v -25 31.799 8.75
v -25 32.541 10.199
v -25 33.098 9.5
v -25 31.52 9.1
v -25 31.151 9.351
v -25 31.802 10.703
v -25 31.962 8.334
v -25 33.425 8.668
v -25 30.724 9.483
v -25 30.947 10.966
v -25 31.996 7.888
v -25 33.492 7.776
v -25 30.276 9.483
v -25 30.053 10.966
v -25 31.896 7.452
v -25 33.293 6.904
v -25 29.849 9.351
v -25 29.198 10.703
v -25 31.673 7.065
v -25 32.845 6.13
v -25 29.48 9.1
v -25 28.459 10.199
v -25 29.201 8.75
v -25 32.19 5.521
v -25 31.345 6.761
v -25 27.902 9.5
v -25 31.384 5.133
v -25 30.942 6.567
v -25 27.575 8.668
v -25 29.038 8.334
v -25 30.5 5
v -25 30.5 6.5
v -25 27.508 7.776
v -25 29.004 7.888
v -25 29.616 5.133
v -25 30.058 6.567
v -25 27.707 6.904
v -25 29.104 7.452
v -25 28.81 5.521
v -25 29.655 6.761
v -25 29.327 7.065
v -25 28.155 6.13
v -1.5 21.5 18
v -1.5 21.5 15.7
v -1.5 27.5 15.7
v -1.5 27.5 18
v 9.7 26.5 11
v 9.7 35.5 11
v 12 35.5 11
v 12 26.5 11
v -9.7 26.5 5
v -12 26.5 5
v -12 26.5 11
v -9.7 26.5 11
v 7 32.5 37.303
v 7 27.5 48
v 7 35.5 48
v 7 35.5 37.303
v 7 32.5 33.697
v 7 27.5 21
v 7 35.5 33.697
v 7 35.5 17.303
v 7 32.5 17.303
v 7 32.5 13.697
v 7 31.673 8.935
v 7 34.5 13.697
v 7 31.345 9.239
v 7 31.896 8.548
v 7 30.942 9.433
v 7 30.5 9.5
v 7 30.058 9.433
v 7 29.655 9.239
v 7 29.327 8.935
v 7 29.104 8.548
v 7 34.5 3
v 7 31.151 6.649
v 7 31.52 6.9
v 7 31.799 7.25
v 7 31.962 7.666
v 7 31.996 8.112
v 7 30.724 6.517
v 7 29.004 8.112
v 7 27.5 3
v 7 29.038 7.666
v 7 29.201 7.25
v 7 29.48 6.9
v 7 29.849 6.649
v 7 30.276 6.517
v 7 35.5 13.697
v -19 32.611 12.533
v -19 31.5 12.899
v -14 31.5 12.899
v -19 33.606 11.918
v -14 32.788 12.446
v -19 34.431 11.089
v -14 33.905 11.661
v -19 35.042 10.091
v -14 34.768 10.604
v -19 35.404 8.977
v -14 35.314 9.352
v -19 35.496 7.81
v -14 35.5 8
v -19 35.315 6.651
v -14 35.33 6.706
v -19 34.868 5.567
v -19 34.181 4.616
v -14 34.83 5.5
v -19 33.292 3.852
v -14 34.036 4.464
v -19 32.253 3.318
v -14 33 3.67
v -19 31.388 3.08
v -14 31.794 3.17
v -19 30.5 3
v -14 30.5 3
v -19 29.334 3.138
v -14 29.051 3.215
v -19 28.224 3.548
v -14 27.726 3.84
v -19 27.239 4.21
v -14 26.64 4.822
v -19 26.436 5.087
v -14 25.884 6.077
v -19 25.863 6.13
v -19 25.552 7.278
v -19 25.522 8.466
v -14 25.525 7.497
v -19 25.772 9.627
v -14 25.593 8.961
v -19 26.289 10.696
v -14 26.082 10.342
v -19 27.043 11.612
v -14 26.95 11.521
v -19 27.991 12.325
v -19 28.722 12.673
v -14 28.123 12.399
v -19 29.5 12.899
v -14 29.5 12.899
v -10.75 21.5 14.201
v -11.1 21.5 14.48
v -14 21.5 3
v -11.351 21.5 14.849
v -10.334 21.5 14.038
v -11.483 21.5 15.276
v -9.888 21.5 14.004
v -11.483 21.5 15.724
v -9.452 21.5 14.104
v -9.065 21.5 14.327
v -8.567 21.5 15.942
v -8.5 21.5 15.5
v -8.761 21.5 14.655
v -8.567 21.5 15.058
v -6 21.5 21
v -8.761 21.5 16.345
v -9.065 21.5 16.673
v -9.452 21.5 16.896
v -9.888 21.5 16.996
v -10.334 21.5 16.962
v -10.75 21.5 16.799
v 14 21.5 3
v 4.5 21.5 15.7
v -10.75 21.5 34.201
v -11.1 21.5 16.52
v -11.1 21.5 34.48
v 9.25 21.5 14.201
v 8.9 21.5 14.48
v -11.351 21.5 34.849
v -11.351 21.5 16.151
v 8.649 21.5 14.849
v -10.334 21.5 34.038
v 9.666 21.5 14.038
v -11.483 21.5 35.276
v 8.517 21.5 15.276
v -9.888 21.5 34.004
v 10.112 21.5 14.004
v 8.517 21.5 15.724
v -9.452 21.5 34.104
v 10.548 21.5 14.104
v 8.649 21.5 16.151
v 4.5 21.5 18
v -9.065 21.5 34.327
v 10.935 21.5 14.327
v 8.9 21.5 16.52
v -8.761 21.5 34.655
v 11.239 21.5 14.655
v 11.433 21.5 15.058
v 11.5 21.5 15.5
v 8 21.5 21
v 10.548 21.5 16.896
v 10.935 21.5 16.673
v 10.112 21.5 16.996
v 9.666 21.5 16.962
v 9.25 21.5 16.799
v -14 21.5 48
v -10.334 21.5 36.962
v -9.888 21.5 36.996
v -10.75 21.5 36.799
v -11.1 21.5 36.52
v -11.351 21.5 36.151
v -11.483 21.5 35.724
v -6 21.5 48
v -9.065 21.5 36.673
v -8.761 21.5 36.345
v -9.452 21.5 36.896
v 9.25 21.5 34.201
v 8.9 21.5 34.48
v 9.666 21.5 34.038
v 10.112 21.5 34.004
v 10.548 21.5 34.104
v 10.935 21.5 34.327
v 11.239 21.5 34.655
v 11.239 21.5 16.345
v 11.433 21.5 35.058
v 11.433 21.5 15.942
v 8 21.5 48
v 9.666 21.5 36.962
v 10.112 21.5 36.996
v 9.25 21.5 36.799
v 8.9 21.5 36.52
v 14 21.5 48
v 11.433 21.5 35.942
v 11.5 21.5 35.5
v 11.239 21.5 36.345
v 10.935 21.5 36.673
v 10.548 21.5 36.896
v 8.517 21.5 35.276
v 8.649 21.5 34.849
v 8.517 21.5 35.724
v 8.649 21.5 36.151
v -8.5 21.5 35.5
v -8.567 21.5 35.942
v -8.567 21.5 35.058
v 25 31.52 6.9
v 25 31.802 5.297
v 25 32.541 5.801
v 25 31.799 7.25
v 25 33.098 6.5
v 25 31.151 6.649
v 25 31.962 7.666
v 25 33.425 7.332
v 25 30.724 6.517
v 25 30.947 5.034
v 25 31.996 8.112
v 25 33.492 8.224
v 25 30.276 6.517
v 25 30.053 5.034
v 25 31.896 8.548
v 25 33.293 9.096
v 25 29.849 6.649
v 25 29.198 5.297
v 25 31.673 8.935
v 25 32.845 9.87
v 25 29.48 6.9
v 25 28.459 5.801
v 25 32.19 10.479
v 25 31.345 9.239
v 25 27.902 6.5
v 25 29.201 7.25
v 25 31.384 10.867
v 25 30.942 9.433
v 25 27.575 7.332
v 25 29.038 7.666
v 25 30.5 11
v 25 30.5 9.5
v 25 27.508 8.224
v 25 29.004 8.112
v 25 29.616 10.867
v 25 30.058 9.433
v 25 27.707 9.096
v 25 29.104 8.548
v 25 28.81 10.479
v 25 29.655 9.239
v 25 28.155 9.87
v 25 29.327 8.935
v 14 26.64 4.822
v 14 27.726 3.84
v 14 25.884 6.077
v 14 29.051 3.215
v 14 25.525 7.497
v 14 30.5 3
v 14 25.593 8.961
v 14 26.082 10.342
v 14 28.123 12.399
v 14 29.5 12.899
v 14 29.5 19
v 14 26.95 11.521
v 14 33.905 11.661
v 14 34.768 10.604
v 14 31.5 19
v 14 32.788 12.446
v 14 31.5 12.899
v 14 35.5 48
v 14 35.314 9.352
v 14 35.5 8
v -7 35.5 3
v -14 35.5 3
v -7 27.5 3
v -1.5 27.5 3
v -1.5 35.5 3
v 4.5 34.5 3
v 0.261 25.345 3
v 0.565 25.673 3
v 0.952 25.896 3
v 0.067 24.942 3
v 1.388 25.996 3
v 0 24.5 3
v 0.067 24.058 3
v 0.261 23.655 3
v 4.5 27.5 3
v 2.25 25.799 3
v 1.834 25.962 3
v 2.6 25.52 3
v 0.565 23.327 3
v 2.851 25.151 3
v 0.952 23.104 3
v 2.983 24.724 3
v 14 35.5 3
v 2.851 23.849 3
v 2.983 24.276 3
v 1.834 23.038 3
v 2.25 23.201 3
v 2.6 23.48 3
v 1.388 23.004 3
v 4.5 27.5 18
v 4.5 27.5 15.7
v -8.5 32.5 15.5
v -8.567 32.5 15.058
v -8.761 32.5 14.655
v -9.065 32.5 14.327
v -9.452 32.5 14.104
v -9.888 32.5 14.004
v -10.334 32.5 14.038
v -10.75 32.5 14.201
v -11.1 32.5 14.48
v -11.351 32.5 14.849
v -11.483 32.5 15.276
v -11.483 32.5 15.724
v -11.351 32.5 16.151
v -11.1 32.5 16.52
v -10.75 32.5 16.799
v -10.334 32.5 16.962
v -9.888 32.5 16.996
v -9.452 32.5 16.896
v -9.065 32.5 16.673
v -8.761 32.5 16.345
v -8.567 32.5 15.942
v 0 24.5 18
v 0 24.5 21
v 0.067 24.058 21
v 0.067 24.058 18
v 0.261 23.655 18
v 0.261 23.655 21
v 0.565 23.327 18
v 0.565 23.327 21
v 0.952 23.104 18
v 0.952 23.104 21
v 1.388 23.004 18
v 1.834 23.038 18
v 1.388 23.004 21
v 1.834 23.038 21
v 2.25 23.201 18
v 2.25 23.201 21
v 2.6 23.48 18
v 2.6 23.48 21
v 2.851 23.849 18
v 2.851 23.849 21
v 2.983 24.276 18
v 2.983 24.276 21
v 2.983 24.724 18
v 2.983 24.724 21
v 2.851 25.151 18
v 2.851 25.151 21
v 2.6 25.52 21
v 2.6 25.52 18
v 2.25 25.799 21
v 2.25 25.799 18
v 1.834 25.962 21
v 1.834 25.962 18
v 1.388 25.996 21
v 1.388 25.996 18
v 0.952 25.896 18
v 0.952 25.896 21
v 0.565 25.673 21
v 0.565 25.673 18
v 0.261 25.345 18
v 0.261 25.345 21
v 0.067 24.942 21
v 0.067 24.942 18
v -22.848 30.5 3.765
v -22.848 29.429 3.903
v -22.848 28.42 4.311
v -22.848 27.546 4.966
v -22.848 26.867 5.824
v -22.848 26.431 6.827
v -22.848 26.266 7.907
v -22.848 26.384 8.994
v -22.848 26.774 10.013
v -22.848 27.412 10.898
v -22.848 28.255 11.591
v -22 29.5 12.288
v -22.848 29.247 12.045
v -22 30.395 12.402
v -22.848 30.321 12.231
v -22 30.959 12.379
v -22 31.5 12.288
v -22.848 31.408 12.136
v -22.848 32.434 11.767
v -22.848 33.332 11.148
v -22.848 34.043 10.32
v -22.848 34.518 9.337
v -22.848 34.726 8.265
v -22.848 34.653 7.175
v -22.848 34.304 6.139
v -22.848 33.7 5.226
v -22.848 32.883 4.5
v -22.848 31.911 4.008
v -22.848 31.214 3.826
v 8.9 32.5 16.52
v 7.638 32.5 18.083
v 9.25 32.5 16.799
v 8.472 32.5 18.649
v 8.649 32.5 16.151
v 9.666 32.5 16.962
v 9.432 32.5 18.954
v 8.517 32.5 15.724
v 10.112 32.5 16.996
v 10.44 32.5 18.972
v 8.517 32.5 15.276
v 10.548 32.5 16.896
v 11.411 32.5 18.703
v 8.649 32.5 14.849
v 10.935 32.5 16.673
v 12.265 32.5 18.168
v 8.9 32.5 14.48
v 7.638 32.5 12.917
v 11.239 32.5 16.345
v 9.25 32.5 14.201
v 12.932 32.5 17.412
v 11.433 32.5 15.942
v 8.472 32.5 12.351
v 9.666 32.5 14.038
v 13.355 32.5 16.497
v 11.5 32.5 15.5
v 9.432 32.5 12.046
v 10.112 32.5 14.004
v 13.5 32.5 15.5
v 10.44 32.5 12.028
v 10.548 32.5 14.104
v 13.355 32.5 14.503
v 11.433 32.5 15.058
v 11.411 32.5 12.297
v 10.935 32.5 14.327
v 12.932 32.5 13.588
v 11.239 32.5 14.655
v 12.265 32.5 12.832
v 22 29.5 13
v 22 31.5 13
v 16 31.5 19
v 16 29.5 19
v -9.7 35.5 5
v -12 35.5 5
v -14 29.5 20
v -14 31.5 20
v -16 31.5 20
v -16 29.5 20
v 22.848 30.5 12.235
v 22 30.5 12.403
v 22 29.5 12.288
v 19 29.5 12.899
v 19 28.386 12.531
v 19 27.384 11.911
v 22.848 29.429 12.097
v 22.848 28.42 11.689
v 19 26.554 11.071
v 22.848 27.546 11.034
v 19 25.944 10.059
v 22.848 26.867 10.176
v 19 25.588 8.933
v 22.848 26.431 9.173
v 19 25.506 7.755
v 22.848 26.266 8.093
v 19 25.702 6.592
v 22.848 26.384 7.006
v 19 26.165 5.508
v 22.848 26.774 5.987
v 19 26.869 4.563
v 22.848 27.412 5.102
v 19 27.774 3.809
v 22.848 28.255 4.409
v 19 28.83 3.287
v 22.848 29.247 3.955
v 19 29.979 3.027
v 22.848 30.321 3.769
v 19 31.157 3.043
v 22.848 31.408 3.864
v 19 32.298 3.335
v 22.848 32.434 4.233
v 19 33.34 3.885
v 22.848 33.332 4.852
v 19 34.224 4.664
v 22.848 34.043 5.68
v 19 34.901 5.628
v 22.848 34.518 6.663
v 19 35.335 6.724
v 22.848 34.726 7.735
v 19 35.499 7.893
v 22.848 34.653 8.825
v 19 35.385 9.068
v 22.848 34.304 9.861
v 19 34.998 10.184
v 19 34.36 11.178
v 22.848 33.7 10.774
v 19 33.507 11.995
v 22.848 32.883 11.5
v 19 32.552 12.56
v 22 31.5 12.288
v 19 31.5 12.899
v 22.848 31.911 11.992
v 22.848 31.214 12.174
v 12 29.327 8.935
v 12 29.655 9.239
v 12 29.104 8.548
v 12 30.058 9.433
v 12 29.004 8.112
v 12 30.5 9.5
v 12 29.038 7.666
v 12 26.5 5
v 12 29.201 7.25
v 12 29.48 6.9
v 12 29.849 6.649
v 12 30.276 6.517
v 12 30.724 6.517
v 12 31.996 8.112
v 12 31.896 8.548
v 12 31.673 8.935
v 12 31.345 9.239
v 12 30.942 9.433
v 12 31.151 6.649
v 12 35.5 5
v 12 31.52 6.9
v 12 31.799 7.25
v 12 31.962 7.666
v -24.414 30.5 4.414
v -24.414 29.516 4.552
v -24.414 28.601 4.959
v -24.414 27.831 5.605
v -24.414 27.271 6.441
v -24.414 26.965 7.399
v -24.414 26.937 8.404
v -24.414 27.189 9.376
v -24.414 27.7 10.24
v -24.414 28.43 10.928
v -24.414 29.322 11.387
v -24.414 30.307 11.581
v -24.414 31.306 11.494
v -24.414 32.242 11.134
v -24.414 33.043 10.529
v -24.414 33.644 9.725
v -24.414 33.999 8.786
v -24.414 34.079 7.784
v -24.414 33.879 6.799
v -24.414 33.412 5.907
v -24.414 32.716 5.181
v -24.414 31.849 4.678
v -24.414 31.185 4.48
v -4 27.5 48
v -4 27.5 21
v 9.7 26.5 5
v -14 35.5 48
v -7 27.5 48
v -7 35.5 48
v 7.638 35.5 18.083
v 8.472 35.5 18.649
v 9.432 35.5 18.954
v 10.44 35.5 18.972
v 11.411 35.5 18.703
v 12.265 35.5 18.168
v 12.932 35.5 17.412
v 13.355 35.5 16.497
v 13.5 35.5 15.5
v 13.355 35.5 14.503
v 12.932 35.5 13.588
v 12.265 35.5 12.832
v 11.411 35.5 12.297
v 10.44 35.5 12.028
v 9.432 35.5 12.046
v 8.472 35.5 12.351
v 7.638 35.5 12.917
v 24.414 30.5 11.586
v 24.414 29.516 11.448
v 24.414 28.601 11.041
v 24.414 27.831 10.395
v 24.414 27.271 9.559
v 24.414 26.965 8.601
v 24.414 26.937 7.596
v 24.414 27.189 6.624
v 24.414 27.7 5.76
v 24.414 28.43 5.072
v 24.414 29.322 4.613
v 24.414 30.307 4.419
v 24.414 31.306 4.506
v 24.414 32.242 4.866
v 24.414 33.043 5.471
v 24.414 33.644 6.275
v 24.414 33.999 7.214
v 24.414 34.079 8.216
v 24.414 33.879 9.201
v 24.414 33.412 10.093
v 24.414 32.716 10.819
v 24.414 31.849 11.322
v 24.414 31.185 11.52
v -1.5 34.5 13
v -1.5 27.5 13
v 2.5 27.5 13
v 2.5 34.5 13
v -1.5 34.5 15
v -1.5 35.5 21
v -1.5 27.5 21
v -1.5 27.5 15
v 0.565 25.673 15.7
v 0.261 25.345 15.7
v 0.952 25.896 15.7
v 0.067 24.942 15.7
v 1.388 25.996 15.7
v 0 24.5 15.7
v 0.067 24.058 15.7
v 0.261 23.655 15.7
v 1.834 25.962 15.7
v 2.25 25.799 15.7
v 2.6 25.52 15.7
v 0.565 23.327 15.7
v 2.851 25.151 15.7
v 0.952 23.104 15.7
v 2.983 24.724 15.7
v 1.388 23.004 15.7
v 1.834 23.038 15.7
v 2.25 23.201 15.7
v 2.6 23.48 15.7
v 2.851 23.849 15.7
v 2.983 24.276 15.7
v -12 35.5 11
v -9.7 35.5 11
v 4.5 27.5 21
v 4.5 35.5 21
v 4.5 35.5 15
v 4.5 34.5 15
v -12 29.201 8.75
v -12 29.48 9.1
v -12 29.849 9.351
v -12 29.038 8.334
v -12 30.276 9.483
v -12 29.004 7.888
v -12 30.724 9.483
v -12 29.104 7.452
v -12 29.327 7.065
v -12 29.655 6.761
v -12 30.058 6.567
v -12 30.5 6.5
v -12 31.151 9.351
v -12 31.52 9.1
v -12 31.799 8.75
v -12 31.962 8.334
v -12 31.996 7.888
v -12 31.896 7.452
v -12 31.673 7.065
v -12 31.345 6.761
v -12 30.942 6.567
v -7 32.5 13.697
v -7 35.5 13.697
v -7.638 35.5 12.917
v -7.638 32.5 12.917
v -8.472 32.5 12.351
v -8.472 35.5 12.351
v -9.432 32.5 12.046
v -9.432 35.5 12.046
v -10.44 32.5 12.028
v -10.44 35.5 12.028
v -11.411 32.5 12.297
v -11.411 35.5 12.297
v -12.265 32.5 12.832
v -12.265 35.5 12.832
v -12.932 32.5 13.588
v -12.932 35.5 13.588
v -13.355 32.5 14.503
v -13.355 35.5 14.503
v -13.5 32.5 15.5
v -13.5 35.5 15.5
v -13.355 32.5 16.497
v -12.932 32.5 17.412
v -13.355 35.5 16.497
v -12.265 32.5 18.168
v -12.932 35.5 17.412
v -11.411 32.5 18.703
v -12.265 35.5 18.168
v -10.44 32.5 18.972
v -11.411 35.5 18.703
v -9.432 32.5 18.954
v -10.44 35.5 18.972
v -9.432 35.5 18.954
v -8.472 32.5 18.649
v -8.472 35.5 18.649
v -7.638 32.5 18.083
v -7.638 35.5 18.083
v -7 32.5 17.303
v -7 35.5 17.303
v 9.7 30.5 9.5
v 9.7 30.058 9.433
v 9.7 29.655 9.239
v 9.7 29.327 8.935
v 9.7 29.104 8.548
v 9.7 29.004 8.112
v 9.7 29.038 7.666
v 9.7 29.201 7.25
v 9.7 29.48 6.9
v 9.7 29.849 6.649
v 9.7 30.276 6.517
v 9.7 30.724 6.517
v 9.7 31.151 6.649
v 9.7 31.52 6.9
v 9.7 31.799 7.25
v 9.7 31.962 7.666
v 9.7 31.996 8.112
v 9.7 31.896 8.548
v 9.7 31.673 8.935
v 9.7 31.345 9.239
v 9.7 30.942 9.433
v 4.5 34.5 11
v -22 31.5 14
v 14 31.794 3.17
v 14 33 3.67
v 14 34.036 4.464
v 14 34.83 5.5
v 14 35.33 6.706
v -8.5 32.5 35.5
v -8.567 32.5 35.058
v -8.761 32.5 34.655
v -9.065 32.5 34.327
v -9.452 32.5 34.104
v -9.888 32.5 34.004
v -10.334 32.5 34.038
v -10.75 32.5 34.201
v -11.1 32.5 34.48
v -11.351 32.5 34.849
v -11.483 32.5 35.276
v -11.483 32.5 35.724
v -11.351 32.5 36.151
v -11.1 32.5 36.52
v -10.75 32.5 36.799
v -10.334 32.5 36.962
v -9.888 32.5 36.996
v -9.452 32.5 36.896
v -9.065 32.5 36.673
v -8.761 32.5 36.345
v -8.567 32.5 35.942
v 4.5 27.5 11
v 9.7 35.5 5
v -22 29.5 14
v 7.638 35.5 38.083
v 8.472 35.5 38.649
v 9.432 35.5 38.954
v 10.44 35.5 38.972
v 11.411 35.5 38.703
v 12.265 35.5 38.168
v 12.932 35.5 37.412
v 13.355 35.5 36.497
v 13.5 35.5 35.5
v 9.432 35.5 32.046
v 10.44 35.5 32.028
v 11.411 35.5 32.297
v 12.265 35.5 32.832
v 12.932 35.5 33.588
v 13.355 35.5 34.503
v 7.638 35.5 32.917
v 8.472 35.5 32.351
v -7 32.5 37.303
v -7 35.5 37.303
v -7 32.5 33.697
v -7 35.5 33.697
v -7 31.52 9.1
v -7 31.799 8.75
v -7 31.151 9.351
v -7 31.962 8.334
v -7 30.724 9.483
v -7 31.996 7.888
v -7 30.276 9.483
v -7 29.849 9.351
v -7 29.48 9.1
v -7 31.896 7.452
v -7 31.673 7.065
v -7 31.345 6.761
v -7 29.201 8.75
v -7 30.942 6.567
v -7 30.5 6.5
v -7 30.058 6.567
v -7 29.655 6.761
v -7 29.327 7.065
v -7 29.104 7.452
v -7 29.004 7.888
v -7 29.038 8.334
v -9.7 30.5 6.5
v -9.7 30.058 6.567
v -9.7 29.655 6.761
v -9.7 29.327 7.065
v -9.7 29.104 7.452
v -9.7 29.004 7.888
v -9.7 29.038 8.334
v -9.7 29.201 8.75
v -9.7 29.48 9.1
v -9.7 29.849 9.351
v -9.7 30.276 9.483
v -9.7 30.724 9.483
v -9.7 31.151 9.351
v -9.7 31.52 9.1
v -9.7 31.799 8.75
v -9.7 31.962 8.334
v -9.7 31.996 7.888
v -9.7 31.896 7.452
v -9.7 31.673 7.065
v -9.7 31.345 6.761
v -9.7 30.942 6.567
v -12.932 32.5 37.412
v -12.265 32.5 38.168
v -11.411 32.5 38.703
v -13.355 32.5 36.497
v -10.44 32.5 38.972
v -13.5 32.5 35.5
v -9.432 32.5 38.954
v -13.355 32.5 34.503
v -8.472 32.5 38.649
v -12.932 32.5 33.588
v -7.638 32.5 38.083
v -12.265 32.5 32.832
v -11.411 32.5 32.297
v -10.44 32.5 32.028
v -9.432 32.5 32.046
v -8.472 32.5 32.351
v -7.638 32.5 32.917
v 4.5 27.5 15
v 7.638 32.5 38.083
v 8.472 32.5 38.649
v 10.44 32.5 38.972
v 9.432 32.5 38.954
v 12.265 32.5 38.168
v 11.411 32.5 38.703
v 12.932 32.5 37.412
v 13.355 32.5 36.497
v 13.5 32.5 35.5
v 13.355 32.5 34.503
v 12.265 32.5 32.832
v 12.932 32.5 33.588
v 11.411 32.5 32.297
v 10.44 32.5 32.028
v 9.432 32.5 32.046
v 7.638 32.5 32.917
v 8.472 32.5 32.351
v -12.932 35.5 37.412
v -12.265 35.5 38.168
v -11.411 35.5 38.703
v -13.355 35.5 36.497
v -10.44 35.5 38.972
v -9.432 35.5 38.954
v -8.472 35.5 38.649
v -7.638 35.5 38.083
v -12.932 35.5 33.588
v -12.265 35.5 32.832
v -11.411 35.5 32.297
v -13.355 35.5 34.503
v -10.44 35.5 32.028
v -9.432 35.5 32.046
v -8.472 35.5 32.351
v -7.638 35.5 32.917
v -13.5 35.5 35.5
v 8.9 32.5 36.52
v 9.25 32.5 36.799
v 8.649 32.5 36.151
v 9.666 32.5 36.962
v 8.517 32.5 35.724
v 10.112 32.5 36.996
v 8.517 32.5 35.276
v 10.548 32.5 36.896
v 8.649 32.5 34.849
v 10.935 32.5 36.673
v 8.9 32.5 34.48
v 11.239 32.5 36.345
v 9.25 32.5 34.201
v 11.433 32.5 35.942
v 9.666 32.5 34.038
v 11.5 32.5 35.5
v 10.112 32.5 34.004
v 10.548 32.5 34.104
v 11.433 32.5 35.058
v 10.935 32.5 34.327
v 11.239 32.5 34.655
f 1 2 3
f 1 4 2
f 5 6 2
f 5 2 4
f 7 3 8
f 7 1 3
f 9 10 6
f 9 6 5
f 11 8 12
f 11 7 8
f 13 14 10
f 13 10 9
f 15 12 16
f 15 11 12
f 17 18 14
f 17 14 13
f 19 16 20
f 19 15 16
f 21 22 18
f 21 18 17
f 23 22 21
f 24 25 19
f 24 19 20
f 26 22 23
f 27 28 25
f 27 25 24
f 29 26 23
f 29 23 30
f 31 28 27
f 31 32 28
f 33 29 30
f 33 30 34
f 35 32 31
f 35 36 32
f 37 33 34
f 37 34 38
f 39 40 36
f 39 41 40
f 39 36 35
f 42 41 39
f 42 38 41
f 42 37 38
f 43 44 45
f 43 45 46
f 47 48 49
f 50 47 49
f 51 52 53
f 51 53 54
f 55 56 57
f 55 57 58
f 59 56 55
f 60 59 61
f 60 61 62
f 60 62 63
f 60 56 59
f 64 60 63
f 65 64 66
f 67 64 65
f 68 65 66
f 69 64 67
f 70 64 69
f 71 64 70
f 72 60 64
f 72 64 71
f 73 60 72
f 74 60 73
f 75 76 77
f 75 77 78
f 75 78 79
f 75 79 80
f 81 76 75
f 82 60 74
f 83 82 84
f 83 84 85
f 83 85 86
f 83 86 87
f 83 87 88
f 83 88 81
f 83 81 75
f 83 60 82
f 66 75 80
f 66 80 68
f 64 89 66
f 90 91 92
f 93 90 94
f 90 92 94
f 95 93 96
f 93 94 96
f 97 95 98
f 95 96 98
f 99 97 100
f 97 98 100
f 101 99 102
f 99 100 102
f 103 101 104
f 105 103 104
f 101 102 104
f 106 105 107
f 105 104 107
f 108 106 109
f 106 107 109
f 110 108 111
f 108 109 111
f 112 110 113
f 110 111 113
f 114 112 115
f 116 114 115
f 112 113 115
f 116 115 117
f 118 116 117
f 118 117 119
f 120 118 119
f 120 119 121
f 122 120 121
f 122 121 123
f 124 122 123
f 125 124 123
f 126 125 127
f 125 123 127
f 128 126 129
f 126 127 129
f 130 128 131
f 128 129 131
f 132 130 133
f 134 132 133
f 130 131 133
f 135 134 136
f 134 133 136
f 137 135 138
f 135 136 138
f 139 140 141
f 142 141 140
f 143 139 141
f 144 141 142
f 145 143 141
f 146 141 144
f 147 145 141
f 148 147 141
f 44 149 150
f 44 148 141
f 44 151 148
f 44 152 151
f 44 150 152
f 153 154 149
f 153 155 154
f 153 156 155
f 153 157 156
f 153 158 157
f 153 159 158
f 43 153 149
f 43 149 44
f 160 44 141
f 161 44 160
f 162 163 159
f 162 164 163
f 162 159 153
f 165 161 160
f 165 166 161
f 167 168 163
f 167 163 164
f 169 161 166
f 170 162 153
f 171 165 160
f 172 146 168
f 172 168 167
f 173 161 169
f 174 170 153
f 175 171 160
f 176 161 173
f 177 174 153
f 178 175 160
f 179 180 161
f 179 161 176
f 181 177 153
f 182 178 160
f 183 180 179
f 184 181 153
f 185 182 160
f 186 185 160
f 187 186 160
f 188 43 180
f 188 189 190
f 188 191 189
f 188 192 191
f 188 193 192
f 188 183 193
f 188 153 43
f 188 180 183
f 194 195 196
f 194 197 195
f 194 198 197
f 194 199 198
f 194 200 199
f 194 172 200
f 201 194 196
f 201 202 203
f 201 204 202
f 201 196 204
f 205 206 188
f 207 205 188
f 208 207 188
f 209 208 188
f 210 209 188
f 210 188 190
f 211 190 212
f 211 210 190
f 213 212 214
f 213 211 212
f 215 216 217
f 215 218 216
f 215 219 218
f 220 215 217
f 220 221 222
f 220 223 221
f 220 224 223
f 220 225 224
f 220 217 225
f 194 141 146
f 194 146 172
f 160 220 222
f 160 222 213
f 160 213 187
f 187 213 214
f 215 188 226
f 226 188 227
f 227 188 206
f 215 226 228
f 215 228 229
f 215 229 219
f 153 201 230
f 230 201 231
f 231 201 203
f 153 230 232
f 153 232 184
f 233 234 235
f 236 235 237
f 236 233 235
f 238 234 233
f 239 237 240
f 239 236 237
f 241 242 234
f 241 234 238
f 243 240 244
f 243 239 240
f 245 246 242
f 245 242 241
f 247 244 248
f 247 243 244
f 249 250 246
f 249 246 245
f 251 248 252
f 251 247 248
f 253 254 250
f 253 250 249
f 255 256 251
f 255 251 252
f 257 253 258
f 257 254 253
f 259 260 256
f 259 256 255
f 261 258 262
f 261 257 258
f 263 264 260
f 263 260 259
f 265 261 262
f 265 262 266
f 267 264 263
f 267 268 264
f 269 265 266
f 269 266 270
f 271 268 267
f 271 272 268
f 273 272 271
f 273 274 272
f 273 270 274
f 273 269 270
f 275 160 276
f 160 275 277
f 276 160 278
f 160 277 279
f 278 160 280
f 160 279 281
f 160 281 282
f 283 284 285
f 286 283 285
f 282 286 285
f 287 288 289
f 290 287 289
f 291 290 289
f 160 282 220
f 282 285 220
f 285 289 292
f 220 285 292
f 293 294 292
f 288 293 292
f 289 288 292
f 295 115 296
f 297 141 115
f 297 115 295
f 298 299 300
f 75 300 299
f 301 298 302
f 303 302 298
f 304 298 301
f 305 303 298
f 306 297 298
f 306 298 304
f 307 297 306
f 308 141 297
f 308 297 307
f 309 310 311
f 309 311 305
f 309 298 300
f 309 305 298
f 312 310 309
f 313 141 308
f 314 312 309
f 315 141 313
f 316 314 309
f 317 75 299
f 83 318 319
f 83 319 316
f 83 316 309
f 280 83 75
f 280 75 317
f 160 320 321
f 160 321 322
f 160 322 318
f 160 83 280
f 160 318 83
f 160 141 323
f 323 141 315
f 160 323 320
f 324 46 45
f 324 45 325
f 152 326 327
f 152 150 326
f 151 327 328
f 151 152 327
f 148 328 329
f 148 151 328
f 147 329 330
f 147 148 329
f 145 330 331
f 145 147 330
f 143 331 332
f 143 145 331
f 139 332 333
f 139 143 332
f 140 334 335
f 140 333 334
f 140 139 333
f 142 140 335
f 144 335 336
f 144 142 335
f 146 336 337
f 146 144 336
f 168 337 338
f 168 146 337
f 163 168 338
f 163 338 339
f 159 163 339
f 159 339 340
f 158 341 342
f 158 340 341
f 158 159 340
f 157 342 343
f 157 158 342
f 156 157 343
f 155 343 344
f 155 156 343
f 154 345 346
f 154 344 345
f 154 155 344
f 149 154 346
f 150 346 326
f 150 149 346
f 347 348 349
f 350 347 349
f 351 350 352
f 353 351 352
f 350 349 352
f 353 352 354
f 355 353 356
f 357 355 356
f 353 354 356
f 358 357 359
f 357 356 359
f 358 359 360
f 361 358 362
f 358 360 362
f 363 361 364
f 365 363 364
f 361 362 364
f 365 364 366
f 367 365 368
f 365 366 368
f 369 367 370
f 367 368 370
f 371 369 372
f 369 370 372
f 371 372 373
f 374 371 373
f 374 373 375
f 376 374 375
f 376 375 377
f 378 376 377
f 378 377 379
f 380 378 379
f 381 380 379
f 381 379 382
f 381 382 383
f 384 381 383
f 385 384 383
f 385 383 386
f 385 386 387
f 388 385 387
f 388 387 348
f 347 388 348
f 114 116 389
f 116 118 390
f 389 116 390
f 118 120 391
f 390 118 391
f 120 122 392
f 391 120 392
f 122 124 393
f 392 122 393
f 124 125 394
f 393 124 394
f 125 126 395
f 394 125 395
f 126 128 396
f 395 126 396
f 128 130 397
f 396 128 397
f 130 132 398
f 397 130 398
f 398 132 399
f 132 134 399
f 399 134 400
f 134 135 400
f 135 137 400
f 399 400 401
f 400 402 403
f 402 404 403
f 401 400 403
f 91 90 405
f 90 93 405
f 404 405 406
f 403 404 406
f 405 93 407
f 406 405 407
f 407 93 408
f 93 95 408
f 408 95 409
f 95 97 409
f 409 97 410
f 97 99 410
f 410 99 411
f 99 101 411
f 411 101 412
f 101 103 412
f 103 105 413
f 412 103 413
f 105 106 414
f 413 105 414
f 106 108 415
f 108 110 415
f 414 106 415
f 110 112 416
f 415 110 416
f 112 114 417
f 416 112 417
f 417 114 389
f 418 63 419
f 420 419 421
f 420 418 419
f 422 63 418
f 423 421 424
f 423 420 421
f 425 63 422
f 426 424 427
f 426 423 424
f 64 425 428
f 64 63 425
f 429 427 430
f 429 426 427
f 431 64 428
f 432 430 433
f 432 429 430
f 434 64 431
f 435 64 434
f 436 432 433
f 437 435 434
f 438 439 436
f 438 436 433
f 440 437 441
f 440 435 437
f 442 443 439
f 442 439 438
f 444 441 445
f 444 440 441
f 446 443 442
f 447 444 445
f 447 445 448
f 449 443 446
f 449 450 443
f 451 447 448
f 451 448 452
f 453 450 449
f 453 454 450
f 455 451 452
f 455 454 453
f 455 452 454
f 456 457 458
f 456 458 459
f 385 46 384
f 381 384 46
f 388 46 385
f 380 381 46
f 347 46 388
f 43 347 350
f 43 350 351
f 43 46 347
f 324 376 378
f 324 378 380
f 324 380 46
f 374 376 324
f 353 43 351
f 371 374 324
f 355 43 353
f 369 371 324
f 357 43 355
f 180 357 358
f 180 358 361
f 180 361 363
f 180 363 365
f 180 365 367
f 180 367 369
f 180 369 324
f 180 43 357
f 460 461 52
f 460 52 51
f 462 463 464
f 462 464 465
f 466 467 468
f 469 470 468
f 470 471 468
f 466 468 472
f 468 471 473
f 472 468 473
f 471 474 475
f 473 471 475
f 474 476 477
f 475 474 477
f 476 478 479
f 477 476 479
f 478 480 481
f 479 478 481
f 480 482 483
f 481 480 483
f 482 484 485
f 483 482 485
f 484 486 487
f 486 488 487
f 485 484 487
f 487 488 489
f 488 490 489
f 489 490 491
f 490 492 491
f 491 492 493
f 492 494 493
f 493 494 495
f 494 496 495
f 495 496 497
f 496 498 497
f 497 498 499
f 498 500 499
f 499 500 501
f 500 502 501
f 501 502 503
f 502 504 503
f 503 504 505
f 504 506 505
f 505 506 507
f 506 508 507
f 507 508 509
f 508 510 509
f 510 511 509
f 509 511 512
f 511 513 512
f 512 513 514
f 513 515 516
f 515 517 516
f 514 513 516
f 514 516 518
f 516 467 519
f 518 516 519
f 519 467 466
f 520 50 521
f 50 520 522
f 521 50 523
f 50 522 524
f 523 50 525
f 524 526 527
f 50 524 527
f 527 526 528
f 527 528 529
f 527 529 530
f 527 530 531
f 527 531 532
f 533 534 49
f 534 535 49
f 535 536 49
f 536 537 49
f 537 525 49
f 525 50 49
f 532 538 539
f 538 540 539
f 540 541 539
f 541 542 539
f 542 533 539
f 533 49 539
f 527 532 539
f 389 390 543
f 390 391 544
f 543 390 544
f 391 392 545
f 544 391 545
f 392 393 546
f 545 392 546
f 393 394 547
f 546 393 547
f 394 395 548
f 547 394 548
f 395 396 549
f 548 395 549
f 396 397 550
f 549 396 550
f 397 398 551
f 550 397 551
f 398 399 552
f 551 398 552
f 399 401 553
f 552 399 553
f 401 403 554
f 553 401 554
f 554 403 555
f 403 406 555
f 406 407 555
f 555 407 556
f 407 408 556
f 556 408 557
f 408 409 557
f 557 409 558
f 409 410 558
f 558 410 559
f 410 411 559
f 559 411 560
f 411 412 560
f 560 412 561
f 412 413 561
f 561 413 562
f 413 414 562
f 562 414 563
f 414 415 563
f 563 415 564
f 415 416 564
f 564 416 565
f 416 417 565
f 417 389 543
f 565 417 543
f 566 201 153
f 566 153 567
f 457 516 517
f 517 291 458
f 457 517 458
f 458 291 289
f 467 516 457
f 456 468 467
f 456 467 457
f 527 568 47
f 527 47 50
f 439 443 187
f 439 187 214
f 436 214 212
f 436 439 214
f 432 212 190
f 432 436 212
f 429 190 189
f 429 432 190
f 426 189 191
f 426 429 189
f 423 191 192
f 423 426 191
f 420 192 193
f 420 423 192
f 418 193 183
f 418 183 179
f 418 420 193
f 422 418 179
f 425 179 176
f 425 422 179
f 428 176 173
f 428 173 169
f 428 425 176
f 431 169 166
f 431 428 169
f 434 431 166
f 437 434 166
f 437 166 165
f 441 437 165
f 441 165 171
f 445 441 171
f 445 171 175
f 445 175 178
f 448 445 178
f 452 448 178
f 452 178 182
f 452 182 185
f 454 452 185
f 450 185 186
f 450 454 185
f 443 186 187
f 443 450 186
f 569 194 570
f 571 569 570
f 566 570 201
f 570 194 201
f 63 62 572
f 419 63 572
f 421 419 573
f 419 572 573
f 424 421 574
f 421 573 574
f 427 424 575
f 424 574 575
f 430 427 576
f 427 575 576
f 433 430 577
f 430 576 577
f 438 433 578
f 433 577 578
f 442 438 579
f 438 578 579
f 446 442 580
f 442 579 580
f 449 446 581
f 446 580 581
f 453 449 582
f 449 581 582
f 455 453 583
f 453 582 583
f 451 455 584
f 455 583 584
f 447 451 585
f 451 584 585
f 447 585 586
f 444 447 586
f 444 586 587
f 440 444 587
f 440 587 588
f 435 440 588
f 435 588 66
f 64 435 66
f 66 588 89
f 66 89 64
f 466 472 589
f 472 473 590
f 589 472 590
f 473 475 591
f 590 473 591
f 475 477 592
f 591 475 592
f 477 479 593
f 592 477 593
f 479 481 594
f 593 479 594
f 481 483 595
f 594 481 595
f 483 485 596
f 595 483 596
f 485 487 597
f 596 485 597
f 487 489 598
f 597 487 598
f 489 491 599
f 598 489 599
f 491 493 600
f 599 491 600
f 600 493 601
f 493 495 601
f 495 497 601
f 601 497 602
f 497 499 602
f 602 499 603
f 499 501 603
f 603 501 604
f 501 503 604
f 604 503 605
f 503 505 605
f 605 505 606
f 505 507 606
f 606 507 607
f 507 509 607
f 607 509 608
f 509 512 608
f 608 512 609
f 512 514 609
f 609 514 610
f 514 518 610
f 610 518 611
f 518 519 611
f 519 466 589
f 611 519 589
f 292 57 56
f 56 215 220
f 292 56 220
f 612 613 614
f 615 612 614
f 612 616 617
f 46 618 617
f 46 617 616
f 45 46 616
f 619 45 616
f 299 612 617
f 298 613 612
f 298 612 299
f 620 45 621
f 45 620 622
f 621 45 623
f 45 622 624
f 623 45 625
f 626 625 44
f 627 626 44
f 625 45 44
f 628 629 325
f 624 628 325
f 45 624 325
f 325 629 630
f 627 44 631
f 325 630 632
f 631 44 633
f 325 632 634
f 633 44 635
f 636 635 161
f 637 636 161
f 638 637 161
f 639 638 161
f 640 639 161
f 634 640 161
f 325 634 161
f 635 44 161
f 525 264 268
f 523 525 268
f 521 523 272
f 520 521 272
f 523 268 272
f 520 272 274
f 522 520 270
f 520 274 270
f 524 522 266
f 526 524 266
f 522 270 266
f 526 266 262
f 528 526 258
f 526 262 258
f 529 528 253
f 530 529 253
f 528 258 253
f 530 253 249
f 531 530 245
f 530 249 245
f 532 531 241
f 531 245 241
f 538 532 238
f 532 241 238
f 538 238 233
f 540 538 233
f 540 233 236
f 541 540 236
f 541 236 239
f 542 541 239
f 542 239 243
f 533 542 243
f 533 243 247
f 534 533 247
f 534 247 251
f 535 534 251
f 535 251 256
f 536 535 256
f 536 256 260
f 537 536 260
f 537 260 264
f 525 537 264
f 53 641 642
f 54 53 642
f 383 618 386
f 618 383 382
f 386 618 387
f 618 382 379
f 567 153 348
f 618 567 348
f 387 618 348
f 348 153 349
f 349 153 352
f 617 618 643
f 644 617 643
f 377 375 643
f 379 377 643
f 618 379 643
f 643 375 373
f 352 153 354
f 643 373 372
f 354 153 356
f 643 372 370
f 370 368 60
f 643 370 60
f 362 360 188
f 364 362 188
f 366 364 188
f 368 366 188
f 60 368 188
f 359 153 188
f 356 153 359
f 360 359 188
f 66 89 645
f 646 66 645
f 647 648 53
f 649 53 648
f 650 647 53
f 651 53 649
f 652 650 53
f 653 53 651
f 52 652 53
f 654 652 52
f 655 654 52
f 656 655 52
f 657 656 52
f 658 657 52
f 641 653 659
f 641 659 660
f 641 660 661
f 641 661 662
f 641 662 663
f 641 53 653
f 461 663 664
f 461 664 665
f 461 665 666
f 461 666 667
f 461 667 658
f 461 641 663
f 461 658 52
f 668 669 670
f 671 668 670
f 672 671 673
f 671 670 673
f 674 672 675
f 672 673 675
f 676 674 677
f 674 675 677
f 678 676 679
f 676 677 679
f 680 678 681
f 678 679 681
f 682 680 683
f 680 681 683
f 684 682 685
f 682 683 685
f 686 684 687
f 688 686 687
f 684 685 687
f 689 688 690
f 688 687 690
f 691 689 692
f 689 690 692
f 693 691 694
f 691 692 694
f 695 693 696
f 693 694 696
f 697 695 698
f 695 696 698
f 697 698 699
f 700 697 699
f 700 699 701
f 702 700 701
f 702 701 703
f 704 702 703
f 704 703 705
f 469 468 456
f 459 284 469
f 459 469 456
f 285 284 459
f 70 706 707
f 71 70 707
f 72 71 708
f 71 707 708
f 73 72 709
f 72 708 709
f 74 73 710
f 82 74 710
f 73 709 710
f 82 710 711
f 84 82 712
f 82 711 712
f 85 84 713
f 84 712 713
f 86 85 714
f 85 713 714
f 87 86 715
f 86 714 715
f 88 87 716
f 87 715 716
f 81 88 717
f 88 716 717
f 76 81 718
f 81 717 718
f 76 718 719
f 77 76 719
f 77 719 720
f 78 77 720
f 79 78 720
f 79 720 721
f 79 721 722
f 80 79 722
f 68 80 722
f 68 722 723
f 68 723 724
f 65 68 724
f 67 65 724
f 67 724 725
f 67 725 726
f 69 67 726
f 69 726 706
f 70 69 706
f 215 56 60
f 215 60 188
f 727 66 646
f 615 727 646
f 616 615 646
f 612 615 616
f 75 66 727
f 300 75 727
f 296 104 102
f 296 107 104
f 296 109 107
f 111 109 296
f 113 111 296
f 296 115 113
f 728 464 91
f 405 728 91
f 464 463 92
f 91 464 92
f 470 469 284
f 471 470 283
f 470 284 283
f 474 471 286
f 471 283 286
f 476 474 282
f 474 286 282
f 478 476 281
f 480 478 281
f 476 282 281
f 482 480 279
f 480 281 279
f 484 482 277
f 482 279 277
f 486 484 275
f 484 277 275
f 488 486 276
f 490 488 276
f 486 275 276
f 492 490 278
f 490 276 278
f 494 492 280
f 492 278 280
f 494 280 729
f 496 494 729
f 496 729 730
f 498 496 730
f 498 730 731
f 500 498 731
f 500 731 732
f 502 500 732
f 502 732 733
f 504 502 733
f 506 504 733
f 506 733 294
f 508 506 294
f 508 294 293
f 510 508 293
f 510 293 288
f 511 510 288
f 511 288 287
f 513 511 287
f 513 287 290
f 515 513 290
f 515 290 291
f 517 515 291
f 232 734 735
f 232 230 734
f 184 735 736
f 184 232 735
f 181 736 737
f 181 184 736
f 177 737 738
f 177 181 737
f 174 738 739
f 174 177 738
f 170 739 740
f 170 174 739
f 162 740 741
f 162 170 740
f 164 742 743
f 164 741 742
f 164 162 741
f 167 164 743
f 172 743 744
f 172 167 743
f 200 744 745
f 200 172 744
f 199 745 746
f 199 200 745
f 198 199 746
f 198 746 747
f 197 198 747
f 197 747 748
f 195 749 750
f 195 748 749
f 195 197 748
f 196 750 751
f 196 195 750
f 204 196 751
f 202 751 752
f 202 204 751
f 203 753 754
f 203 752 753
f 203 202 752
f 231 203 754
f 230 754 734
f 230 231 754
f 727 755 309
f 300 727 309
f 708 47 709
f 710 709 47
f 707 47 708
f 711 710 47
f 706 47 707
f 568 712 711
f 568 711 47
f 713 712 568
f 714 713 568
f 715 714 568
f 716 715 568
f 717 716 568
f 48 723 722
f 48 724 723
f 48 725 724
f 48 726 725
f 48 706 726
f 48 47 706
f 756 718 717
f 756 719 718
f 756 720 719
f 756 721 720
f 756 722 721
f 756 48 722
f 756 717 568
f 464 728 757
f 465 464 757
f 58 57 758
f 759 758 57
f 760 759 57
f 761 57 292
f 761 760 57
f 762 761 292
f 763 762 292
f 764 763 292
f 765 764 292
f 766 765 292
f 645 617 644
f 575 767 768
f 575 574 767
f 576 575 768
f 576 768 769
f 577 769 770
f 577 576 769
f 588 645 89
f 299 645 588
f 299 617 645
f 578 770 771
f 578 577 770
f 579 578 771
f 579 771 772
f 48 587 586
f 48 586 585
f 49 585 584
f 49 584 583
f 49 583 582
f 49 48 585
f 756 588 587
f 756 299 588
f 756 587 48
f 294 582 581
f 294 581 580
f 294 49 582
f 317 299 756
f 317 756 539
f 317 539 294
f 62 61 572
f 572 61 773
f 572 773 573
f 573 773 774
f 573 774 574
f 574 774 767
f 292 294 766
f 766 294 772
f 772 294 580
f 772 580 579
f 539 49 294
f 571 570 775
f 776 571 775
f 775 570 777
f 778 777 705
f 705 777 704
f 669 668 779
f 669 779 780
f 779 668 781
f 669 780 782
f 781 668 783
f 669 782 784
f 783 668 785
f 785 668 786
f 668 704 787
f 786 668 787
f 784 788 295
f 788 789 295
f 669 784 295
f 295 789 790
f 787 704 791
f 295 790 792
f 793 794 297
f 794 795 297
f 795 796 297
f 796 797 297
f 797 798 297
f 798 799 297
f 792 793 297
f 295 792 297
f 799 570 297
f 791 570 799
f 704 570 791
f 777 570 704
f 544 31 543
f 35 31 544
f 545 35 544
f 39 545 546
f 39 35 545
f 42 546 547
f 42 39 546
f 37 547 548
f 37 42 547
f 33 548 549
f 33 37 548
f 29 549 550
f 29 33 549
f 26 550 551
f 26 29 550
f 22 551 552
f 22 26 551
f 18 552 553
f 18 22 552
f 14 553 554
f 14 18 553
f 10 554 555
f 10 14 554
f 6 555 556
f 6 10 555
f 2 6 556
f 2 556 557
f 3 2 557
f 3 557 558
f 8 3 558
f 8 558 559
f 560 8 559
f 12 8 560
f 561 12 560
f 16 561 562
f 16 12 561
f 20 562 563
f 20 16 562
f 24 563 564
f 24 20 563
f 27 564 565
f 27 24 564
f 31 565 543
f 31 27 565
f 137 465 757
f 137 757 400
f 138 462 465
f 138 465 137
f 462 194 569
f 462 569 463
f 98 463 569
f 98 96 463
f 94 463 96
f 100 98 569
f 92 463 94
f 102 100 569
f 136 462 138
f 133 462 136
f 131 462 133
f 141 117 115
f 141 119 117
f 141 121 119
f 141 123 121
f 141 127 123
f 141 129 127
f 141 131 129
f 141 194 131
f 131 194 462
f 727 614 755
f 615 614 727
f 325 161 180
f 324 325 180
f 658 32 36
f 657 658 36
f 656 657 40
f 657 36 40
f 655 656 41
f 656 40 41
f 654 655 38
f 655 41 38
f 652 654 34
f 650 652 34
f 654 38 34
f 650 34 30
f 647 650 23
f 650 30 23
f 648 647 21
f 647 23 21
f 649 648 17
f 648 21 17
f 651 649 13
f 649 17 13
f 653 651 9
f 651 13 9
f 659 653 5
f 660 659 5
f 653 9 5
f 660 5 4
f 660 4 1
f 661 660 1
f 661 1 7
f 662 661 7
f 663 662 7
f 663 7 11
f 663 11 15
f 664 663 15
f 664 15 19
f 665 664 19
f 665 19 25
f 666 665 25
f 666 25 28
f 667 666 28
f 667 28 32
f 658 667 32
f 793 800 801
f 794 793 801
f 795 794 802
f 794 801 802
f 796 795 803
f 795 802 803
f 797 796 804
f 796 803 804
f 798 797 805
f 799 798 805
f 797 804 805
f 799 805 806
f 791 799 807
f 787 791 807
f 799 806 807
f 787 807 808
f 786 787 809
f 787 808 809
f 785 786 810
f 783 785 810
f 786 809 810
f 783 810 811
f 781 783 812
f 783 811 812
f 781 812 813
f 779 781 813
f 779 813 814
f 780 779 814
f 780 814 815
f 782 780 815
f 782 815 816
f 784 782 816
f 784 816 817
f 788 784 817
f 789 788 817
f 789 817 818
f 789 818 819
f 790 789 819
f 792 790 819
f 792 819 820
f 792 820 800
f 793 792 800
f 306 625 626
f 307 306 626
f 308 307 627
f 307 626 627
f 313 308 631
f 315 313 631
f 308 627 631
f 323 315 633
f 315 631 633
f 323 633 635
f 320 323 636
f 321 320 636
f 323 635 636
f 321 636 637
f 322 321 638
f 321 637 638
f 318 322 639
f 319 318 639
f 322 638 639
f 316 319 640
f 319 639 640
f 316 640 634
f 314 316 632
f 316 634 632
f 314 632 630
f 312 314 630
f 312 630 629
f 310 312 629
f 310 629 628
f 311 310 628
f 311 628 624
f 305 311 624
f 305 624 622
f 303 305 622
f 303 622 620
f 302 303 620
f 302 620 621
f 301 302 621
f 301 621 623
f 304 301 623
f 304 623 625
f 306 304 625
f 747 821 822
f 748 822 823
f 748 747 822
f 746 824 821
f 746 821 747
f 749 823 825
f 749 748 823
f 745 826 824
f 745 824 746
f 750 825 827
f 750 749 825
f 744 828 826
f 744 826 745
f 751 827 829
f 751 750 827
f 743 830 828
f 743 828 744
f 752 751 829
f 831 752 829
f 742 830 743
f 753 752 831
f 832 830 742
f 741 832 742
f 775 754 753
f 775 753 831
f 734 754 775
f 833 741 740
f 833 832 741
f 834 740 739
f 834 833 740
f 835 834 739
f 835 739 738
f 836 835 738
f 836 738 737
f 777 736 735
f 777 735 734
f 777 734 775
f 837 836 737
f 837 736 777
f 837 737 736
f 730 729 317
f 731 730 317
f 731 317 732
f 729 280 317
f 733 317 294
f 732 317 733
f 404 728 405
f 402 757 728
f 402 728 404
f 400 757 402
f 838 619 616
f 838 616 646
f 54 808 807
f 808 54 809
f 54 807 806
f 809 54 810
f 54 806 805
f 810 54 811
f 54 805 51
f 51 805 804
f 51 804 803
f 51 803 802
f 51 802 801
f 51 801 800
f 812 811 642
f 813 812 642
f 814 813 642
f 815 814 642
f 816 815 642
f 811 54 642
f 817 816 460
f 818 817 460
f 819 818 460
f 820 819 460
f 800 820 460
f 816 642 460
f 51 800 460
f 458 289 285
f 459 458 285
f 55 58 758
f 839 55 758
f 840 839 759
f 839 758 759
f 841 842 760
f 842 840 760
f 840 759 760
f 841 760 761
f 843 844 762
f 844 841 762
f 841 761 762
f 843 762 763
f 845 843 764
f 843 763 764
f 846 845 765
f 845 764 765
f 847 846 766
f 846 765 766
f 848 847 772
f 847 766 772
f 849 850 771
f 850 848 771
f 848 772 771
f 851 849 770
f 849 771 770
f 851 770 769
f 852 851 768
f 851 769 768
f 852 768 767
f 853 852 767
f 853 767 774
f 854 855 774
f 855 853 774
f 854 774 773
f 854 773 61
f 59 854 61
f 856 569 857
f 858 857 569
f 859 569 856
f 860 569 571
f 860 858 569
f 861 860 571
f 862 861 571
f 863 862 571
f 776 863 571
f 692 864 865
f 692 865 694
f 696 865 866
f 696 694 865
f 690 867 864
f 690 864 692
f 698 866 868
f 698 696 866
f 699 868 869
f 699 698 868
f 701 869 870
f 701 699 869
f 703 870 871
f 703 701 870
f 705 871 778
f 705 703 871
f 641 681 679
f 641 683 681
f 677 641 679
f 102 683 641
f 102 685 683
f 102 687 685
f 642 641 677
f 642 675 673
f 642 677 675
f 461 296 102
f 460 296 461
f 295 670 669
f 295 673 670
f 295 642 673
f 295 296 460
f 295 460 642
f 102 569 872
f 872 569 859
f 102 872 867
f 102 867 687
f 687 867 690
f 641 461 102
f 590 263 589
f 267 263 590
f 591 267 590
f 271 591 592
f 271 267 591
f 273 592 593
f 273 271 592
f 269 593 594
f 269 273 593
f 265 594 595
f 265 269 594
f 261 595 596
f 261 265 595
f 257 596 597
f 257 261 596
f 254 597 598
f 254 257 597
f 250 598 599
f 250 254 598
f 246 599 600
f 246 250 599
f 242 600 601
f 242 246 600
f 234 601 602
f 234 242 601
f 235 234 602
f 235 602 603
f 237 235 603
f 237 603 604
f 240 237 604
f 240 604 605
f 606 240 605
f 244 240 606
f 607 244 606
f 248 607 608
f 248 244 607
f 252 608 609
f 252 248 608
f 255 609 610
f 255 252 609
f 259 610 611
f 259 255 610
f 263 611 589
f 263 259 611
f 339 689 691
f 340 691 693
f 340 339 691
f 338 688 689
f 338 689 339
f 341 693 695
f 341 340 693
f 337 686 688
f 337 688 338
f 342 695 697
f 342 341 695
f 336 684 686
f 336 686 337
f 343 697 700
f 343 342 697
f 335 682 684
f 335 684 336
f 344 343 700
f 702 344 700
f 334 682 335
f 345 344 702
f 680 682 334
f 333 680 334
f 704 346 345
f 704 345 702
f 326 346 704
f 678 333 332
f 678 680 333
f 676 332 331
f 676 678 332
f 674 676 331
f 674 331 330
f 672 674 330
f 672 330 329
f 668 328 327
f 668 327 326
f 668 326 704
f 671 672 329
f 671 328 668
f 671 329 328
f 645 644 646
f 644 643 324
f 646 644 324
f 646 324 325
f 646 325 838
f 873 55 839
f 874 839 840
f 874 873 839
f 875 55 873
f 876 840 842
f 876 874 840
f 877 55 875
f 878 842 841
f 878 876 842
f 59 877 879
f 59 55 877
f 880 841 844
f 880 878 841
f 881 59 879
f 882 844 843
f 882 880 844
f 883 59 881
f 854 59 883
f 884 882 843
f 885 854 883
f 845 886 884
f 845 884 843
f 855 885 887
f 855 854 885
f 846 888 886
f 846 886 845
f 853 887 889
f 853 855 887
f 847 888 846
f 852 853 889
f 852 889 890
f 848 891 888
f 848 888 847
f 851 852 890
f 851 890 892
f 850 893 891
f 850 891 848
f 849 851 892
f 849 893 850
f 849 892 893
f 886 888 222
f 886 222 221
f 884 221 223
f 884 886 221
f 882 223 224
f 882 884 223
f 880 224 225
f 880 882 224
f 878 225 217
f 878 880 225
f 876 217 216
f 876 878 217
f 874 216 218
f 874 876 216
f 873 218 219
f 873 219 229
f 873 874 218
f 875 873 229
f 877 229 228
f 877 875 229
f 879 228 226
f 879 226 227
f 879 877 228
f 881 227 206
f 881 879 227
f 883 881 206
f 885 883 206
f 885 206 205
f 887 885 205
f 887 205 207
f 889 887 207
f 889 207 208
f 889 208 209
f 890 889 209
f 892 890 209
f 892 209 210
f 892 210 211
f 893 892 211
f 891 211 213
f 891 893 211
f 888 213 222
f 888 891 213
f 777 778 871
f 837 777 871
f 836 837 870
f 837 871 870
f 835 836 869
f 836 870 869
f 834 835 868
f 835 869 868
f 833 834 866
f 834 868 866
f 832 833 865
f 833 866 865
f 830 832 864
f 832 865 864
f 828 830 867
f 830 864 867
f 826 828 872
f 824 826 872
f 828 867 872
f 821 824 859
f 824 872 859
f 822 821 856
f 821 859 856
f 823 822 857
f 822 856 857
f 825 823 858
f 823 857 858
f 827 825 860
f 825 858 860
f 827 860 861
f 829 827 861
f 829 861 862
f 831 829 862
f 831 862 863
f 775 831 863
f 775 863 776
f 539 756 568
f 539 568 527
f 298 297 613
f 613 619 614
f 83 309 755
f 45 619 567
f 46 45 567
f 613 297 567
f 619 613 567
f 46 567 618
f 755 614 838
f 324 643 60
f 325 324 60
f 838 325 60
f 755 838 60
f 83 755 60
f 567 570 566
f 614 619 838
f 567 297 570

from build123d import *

# Parameters (mm, degrees)
SKETCH021_W     = 28
SKETCH021_H     = 45
SKETCH021_R     = 1.5
PAD010_DEPTH    = 6
SKETCH022_W     = 7
SKETCH022_H     = 45
SKETCH022_R     = 1.5
SKETCH022_W_2   = 6
SKETCH022_H_2   = 10
SKETCH022_H_3   = 6
PAD011_DEPTH    = 8
SKETCH032_R     = 3.5
POCKET010_DEPTH = 3
POCKET011_DEPTH = 27
SKETCH034_R     = 1.5
POCKET012_DEPTH = 19
SKETCH035_R     = 5
PAD012_DEPTH    = 11
SKETCH036_R     = 5
PAD013_DEPTH    = 11
SKETCH037_R     = 1.5
POCKET013_DEPTH = 20
SKETCH038_R     = 1.5
POCKET014_DEPTH = 20
CHAMFER005_SIZE = 2
CHAMFER006_SIZE = 2
CHAMFER007_SIZE = 2
SKETCH039_W     = 9
SKETCH039_H     = 2
PAD014_DEPTH    = 8
SKETCH040_W     = 8
SKETCH040_H     = 2
PAD015_DEPTH    = 8
CHAMFER008_SIZE = 6
SKETCH041_W     = 6
SKETCH041_H     = 2.3
POCKET015_DEPTH = 6
CHAMFER012_SIZE = 2
PAD017_DEPTH    = 1
SKETCH047_W     = 2.3
SKETCH047_H     = 6
POCKET018_DEPTH = 9


with BuildPart() as part:
    # Sketch021 → Pad010 (new body)
    with BuildSketch(Plane.XZ):
        with Locations((14, 22.5)):
            Rectangle(SKETCH021_W, SKETCH021_H)
        with Locations((4, 32.5)):
            Circle(SKETCH021_R, mode=Mode.SUBTRACT)
        with Locations((24, 32.5)):
            Circle(SKETCH021_R, mode=Mode.SUBTRACT)
        with Locations((4, 12.5)):
            Circle(SKETCH021_R, mode=Mode.SUBTRACT)
        with Locations((24, 12.5)):
            Circle(SKETCH021_R, mode=Mode.SUBTRACT)
    extrude(amount=PAD010_DEPTH)

    # Sketch022 (on Face9 of Pad010) → Pad011 (join)
    with BuildSketch(Plane(origin=(0, 0, 0), x_dir=(1, 0, 0), z_dir=(0, 1, 0))):
        with Locations((3.5, -22.5)):
            Rectangle(SKETCH022_W, SKETCH022_H)
        with Locations((4, -12.5)):
            Circle(SKETCH022_R, mode=Mode.SUBTRACT)
        with Locations((4, -32.5)):
            Circle(SKETCH022_R, mode=Mode.SUBTRACT)
        with Locations((24.5, -22.5)):
            Rectangle(SKETCH022_W, SKETCH022_H)
        with Locations((24, -12.5)):
            Circle(SKETCH022_R, mode=Mode.SUBTRACT)
        with Locations((24, -32.5)):
            Circle(SKETCH022_R, mode=Mode.SUBTRACT)
        with Locations((15.5, -5)):
            Rectangle(SKETCH022_W_2, SKETCH022_H_2)
        with Locations((15.5, -15)):
            Rectangle(SKETCH022_W_2, SKETCH022_H_3)
    extrude(amount=PAD011_DEPTH)

    # Sketch032 → Pocket010 (cut)
    with BuildSketch(Plane(origin=(0, 8, 0), x_dir=(1, 0, 0), z_dir=(0, 1, 0))):
        with Locations((4, -12.5)):
            Circle(SKETCH032_R)
        with Locations((4, -32.5)):
            Circle(SKETCH032_R)
        with Locations((24, -32.5)):
            Circle(SKETCH032_R)
        with Locations((24, -12.5)):
            Circle(SKETCH032_R)
    extrude(amount=-POCKET010_DEPTH, mode=Mode.SUBTRACT)

    # Sketch033 (on Face4 of Pocket010) → Pocket011 (cut)
    with BuildSketch(Plane(origin=(0, 0, 45), x_dir=(-1, 0, 0), z_dir=(0, 0, 1))):
        Polygon((-22, 6), (-8, 6), (-10, 0), (-21, 0), align=None)
    extrude(amount=-POCKET011_DEPTH, mode=Mode.SUBTRACT)

    # Sketch034 (on Face5 of Pocket011) → Pocket012 (cut)
    with BuildSketch(Plane(origin=(0, 0, 18), x_dir=(-1, 0, 0), z_dir=(0, 0, 1))):
        with Locations((-15.5, 3)):
            Circle(SKETCH034_R)
    extrude(amount=-POCKET012_DEPTH, mode=Mode.SUBTRACT)

    # Sketch035 (on Face14 of Pocket012) → Pad012 (join)
    with BuildSketch(Plane(origin=(0, 0, 0), x_dir=(0, 0, -1), z_dir=(-1, 0, 0))):
        with Locations((-5, -3)):
            Circle(SKETCH035_R)
    extrude(amount=PAD012_DEPTH)

    # Sketch036 (on Face21 of Pocket012) → Pad013 (join)
    with BuildSketch(Plane(origin=(28, 0, 0), x_dir=(0, 0, 1), z_dir=(1, 0, 0))):
        with Locations((5, -3)):
            Circle(SKETCH036_R)
    extrude(amount=PAD013_DEPTH)

    # Sketch037 (on Face35 of Pad013) → Pocket013 (cut)
    with BuildSketch(Plane(origin=(-11, 0, 0), x_dir=(0, 0, -1), z_dir=(-1, 0, 0))):
        with Locations((-5, -3)):
            Circle(SKETCH037_R)
    extrude(amount=-POCKET013_DEPTH, mode=Mode.SUBTRACT)

    # Sketch038 (on Face52 of Pocket013) → Pocket014 (cut)
    with BuildSketch(Plane(origin=(39, 0, 0), x_dir=(0, 0, 1), z_dir=(1, 0, 0))):
        with Locations((5, -3)):
            Circle(SKETCH038_R)
    extrude(amount=-POCKET014_DEPTH, mode=Mode.SUBTRACT)

    # Chamfer005
    chamfer005_edges = [part.edges().sort_by_distance(p)[0] for p in [
        (39, 3, 0),
        (-11, 3, 10),
    ]]
    chamfer(chamfer005_edges, length=CHAMFER005_SIZE)

    # Chamfer006
    chamfer006_edges = [part.edges().sort_by_distance(p)[0] for p in [
        (37, 3, 0),
        (-9, 3, 10),
    ]]
    chamfer(chamfer006_edges, length=CHAMFER006_SIZE)

    # Chamfer007
    chamfer007_edges = [part.edges().sort_by_distance(p)[0] for p in [
        (35, 3, 2.2e-05),
        (-7, 3, 9.999978),
    ]]
    chamfer(chamfer007_edges, length=CHAMFER007_SIZE)

    # Sketch039 (on Face4 of Chamfer007) → Pad014 (join)
    with BuildSketch(Plane(origin=(0, 0, 0), x_dir=(0, 0, -1), z_dir=(-1, 0, 0))):
        with Locations((-12.5, -3)):
            Rectangle(SKETCH039_W, SKETCH039_H)
    extrude(amount=PAD014_DEPTH)

    # Sketch040 (on Face48 of Pad014) → Pad015 (join)
    with BuildSketch(Plane(origin=(28, 0, 0), x_dir=(0, 0, 1), z_dir=(1, 0, 0))):
        with Locations((12, -3)):
            Rectangle(SKETCH040_W, SKETCH040_H)
    extrude(amount=PAD015_DEPTH)

    # Chamfer008
    chamfer008_edges = [part.edges().sort_by_distance(p)[0] for p in [
        (-8, 3, 17),
        (36, 3, 16),
    ]]
    chamfer(chamfer008_edges, length=CHAMFER008_SIZE)

    # Sketch041 (on Face17 of Chamfer008) → Pocket015 (cut)
    with BuildSketch(Plane.XZ.offset(6)):
        with Locations((15.5, 13.85)):
            Rectangle(SKETCH041_W, SKETCH041_H)
    extrude(amount=-POCKET015_DEPTH, mode=Mode.SUBTRACT)

    # Chamfer012
    chamfer012_edges = [part.edges().sort_by_distance(p)[0] for p in [
        (18.5, 4, 10),
    ]]
    chamfer(chamfer012_edges, length=CHAMFER012_SIZE)

    # Sketch045 (on Face18 of Chamfer012) → Pad017 (join)
    with BuildSketch(Plane(origin=(0, 8, 0), x_dir=(1, 0, 0), z_dir=(0, 1, 0))):
        Polygon((12.5, 0), (21, 0), (21, -10.697224), (18.5, -12), (18.5, -18), (12.5, -18), align=None)
    extrude(amount=-PAD017_DEPTH)

    # Sketch047 (on Face25 of Pad017) → Pocket018 (cut)
    with BuildSketch(Plane(origin=(0, 8, 0), x_dir=(1, 0, 0), z_dir=(0, 1, 0))):
        with Locations((3.15, -5)):
            Rectangle(SKETCH047_W, SKETCH047_H)
        with Locations((24.85, -5)):
            Rectangle(SKETCH047_W, SKETCH047_H)
    extrude(amount=-POCKET018_DEPTH, mode=Mode.SUBTRACT)


with BuildPart() as part_1:
    # Body007 placement: moved
    add(part.part.moved(Location((-14, 27.5, 3))))


solid = part_1.part
